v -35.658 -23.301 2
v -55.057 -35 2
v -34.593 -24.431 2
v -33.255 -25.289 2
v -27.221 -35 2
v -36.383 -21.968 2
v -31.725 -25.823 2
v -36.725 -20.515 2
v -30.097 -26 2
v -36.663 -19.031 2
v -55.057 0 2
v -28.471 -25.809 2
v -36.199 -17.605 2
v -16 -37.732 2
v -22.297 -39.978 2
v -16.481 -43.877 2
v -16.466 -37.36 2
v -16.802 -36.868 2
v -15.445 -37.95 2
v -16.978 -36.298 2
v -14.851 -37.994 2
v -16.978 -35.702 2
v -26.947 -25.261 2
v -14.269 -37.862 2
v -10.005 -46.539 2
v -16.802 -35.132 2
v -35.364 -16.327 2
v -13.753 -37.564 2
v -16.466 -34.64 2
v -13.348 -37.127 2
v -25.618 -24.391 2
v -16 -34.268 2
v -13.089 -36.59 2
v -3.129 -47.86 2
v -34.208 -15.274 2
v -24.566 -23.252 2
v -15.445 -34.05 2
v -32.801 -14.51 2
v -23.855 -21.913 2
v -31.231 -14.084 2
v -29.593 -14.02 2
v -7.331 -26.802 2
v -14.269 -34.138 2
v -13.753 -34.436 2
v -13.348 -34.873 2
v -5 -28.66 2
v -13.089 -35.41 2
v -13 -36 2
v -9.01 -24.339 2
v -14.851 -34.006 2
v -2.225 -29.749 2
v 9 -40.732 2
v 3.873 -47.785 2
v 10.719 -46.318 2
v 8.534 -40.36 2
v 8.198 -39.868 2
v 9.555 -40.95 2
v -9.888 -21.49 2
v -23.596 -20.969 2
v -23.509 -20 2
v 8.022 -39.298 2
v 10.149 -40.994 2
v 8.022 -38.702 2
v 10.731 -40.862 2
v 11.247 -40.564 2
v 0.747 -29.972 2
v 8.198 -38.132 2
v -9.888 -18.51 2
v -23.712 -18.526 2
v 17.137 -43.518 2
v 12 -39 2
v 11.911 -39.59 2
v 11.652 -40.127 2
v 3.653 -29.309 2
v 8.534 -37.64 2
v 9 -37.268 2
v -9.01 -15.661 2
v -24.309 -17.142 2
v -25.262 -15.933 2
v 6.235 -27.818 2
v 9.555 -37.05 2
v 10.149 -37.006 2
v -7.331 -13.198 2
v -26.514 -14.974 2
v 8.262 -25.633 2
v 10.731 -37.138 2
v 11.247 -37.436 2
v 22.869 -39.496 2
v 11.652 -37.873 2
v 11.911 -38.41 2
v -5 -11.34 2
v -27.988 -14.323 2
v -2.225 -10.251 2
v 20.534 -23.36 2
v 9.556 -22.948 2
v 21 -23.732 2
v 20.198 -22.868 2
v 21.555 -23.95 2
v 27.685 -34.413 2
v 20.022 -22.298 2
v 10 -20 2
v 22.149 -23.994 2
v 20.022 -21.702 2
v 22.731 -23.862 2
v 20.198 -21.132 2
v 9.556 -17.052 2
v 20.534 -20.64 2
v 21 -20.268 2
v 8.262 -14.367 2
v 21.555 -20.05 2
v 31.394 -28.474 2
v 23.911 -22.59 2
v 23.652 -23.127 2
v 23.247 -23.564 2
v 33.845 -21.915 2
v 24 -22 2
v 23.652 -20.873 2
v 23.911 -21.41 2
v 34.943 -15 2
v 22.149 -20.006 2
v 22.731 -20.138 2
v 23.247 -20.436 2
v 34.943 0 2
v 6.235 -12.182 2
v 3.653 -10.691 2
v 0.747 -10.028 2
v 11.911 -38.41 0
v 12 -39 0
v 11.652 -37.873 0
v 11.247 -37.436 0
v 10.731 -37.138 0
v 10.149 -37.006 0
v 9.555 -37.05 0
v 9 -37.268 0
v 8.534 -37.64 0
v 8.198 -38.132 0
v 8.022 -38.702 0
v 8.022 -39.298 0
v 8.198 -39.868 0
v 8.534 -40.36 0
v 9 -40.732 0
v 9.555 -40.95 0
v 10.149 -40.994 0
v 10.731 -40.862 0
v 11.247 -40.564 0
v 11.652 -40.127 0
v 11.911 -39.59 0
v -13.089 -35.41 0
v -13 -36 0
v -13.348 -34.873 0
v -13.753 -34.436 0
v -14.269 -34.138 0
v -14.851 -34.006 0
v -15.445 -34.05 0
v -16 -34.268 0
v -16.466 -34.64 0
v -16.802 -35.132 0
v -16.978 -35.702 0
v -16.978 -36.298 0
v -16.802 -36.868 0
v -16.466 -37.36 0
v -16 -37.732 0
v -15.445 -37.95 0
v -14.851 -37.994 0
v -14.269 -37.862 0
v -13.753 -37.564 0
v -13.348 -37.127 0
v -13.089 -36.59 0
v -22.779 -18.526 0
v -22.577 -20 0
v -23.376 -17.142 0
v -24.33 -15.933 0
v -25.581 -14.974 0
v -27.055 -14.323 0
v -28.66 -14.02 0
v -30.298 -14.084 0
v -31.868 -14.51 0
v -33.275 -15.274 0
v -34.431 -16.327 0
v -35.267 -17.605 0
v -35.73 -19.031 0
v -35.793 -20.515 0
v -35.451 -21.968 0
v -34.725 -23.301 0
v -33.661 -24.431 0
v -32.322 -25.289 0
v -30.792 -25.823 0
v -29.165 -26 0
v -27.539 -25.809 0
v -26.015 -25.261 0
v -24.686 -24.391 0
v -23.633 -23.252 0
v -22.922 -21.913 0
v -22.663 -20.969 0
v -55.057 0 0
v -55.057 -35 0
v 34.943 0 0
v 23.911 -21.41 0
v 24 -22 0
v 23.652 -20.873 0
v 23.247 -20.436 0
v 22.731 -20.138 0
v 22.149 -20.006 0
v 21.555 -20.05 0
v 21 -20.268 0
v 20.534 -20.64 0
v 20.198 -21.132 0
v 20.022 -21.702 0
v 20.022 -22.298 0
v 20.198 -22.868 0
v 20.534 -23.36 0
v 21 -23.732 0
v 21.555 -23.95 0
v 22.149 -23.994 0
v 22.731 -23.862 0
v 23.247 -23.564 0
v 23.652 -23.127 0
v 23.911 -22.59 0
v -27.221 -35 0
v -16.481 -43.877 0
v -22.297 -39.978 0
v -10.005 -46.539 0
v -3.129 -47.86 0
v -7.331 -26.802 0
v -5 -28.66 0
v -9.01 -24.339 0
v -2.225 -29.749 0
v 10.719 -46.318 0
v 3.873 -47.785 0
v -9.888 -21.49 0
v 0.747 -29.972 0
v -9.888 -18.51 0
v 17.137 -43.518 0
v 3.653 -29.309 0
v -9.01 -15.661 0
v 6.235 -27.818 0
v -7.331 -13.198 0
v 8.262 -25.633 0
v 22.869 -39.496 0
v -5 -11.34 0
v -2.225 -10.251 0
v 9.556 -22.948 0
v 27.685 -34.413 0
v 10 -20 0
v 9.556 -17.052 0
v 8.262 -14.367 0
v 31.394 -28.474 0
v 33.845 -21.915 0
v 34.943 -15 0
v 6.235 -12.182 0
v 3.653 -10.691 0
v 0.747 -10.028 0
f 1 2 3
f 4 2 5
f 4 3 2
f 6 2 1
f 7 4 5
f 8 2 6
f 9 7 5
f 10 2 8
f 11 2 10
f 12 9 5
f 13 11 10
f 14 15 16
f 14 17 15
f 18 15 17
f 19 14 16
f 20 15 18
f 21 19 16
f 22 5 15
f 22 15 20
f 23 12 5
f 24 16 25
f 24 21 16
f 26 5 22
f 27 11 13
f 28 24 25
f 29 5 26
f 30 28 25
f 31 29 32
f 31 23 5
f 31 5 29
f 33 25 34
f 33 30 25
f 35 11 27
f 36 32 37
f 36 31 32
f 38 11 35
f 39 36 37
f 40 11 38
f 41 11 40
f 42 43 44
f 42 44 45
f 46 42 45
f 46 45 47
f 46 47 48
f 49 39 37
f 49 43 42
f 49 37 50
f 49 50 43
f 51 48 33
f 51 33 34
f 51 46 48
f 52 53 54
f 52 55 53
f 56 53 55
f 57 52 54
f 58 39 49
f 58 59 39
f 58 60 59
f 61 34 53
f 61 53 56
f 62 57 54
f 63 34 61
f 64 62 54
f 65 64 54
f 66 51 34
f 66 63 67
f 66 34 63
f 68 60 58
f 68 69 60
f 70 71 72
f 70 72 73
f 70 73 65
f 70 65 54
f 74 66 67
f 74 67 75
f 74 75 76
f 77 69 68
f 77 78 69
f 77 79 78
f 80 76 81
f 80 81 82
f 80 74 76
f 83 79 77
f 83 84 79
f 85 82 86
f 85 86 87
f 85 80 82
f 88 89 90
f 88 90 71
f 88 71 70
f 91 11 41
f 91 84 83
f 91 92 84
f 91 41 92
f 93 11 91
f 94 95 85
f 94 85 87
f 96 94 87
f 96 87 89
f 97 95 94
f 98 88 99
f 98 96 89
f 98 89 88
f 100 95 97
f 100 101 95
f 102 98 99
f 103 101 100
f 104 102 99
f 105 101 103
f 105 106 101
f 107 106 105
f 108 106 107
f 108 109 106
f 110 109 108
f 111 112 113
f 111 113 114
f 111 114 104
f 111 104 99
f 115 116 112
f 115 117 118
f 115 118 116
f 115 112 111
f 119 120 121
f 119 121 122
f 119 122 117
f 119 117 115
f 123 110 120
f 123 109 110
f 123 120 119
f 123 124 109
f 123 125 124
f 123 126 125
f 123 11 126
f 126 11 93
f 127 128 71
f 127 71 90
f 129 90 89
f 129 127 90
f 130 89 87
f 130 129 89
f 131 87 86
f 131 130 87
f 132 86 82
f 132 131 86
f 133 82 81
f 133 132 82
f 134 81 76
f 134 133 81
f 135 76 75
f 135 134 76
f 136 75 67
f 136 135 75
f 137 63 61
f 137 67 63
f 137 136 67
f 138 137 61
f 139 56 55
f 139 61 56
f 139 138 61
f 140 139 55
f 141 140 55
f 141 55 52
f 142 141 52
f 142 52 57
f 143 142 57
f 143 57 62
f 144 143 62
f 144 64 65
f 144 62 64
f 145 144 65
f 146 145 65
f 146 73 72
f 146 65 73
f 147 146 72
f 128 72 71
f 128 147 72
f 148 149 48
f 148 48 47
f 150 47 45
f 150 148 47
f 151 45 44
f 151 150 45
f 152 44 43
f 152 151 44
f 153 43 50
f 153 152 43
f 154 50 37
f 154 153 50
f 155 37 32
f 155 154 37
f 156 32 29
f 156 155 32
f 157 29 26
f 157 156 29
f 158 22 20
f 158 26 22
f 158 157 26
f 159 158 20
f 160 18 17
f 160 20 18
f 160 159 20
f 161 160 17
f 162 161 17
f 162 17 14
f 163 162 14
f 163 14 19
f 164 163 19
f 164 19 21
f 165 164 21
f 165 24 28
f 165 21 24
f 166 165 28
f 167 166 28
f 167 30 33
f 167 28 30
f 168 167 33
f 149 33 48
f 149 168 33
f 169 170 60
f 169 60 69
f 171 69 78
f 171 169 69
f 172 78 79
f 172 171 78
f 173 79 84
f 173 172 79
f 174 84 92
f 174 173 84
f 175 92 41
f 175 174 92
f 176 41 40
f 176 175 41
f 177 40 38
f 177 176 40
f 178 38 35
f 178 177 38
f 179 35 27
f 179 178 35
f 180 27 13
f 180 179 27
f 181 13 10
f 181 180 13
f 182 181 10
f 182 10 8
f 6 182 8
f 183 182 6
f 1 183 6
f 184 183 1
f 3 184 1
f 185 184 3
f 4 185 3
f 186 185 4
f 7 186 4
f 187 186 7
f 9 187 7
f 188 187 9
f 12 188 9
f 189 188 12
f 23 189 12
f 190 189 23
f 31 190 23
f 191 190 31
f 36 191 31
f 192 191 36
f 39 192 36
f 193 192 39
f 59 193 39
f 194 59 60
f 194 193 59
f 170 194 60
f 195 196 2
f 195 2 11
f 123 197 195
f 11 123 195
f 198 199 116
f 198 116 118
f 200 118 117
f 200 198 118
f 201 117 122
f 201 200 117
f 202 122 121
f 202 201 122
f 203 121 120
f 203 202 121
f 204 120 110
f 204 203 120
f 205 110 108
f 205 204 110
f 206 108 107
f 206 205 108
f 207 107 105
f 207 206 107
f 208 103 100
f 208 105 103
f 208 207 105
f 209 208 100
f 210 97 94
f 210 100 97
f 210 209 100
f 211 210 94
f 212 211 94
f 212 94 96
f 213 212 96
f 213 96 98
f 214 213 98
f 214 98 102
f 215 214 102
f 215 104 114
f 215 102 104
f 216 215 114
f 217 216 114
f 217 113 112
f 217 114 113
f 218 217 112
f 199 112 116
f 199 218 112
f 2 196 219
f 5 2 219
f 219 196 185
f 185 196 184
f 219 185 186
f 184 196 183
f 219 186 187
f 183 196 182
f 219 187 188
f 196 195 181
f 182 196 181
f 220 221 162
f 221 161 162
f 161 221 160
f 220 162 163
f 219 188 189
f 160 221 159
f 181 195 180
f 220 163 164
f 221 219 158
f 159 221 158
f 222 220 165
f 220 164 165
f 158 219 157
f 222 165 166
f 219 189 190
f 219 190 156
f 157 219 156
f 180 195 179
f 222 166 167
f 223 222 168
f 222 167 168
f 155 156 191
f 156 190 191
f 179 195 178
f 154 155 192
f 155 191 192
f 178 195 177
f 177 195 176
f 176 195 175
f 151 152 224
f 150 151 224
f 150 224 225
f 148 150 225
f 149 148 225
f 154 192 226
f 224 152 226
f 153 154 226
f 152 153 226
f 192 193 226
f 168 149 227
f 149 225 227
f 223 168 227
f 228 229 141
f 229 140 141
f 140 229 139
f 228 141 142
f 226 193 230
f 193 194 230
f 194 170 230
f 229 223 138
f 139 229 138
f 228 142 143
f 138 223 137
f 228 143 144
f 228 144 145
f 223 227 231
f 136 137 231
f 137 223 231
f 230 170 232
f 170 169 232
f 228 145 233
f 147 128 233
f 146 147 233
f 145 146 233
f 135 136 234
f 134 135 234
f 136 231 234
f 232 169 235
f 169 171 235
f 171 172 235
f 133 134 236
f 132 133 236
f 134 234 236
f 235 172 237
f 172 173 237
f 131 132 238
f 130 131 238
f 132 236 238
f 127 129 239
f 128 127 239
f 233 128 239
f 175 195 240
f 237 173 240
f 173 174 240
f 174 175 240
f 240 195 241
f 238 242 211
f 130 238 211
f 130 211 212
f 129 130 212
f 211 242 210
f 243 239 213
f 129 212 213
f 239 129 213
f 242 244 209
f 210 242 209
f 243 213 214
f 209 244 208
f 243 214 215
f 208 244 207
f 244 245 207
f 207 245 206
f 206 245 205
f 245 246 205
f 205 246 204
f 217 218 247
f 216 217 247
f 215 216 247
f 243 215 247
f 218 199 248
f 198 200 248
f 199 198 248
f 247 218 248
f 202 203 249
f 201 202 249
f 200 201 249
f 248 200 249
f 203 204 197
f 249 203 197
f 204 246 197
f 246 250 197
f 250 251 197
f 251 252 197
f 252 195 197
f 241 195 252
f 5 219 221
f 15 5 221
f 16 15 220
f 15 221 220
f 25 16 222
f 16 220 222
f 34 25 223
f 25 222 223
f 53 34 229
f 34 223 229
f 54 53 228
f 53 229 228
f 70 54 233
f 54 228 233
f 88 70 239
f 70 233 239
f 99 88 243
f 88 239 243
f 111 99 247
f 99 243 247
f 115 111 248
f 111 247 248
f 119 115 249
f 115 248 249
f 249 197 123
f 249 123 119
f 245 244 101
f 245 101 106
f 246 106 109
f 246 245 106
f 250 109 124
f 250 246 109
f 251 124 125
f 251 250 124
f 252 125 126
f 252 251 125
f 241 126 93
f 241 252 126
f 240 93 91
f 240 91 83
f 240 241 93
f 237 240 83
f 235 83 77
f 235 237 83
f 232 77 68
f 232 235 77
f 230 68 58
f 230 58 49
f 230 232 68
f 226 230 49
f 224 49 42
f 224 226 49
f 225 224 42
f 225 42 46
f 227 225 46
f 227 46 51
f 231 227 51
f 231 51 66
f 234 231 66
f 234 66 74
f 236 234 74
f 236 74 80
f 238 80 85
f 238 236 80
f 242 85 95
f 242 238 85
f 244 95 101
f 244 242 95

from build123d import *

# Parameters (mm, degrees)
CYLINDER008_R               = 6
CYLINDER008_DEPTH           = 20
CYLINDER008_PLACEMENT_ANGLE = 25
CYLINDER006_R               = 2
CYLINDER006_DEPTH           = 10
CYLINDER005_R               = 2
CYLINDER005_DEPTH           = 10
CYLINDER004_R               = 2
CYLINDER004_DEPTH           = 10
SKETCH_R                    = 10
EXTRUDE_DEPTH               = 2


with BuildPart() as cylinder008:
    # Cylinder008 → Cylinder008 (new body)
    with BuildSketch(Plane.XY):
        Circle(CYLINDER008_R)
    extrude(amount=CYLINDER008_DEPTH)


with BuildPart() as cylinder008_1:
    # Cylinder008 placement: moved
    add(cylinder008.part.moved(Location((-25, -20, -9))).rotate(Axis((-25, -20, -9), (0, -1, 0)), CYLINDER008_PLACEMENT_ANGLE))


with BuildPart() as cylinder006:
    # Cylinder006 → Cylinder006 (new body)
    with BuildSketch(Plane(origin=(-15, -36, -4), x_dir=(1, 0, 0), z_dir=(0, 0, 1))):
        Circle(CYLINDER006_R)
    extrude(amount=CYLINDER006_DEPTH)


with BuildPart() as cylinder005:
    # Cylinder005 → Cylinder005 (new body)
    with BuildSketch(Plane(origin=(10, -39, -4), x_dir=(1, 0, 0), z_dir=(0, 0, 1))):
        Circle(CYLINDER005_R)
    extrude(amount=CYLINDER005_DEPTH)


with BuildPart() as cylinder004:
    # Cylinder004 → Cylinder004 (new body)
    with BuildSketch(Plane(origin=(22, -22, -4), x_dir=(1, 0, 0), z_dir=(0, 0, 1))):
        Circle(CYLINDER004_R)
    extrude(amount=CYLINDER004_DEPTH)


with BuildPart() as cut007:
    # Sketch → Extrude (new body)
    with BuildSketch(Plane.XY):
        with BuildLine():
            Line((-55.05719, -35), (-27.221315, -35))
            ThreePointArc((-27.221315, -35), (10.719392, -46.318083), (34.94281, -15))
            Line((34.94281, 0), (34.94281, -15))
            Line((34.94281, 0), (-55.05719, 0))
            Line((-55.05719, -35), (-55.05719, 0))
        make_face()
        with Locations((0, -20)):
            Circle(SKETCH_R, mode=Mode.SUBTRACT)
    extrude(amount=EXTRUDE_DEPTH)

    # Cut004: cut Cylinder004
    add(cylinder004.part, mode=Mode.SUBTRACT)

    # Cut005: cut Cylinder005
    add(cylinder005.part, mode=Mode.SUBTRACT)

    # Cut006: cut Cylinder006
    add(cylinder006.part, mode=Mode.SUBTRACT)

    # Cut007: cut Cylinder008
    add(cylinder008_1.part, mode=Mode.SUBTRACT)


solid = cut007.part
